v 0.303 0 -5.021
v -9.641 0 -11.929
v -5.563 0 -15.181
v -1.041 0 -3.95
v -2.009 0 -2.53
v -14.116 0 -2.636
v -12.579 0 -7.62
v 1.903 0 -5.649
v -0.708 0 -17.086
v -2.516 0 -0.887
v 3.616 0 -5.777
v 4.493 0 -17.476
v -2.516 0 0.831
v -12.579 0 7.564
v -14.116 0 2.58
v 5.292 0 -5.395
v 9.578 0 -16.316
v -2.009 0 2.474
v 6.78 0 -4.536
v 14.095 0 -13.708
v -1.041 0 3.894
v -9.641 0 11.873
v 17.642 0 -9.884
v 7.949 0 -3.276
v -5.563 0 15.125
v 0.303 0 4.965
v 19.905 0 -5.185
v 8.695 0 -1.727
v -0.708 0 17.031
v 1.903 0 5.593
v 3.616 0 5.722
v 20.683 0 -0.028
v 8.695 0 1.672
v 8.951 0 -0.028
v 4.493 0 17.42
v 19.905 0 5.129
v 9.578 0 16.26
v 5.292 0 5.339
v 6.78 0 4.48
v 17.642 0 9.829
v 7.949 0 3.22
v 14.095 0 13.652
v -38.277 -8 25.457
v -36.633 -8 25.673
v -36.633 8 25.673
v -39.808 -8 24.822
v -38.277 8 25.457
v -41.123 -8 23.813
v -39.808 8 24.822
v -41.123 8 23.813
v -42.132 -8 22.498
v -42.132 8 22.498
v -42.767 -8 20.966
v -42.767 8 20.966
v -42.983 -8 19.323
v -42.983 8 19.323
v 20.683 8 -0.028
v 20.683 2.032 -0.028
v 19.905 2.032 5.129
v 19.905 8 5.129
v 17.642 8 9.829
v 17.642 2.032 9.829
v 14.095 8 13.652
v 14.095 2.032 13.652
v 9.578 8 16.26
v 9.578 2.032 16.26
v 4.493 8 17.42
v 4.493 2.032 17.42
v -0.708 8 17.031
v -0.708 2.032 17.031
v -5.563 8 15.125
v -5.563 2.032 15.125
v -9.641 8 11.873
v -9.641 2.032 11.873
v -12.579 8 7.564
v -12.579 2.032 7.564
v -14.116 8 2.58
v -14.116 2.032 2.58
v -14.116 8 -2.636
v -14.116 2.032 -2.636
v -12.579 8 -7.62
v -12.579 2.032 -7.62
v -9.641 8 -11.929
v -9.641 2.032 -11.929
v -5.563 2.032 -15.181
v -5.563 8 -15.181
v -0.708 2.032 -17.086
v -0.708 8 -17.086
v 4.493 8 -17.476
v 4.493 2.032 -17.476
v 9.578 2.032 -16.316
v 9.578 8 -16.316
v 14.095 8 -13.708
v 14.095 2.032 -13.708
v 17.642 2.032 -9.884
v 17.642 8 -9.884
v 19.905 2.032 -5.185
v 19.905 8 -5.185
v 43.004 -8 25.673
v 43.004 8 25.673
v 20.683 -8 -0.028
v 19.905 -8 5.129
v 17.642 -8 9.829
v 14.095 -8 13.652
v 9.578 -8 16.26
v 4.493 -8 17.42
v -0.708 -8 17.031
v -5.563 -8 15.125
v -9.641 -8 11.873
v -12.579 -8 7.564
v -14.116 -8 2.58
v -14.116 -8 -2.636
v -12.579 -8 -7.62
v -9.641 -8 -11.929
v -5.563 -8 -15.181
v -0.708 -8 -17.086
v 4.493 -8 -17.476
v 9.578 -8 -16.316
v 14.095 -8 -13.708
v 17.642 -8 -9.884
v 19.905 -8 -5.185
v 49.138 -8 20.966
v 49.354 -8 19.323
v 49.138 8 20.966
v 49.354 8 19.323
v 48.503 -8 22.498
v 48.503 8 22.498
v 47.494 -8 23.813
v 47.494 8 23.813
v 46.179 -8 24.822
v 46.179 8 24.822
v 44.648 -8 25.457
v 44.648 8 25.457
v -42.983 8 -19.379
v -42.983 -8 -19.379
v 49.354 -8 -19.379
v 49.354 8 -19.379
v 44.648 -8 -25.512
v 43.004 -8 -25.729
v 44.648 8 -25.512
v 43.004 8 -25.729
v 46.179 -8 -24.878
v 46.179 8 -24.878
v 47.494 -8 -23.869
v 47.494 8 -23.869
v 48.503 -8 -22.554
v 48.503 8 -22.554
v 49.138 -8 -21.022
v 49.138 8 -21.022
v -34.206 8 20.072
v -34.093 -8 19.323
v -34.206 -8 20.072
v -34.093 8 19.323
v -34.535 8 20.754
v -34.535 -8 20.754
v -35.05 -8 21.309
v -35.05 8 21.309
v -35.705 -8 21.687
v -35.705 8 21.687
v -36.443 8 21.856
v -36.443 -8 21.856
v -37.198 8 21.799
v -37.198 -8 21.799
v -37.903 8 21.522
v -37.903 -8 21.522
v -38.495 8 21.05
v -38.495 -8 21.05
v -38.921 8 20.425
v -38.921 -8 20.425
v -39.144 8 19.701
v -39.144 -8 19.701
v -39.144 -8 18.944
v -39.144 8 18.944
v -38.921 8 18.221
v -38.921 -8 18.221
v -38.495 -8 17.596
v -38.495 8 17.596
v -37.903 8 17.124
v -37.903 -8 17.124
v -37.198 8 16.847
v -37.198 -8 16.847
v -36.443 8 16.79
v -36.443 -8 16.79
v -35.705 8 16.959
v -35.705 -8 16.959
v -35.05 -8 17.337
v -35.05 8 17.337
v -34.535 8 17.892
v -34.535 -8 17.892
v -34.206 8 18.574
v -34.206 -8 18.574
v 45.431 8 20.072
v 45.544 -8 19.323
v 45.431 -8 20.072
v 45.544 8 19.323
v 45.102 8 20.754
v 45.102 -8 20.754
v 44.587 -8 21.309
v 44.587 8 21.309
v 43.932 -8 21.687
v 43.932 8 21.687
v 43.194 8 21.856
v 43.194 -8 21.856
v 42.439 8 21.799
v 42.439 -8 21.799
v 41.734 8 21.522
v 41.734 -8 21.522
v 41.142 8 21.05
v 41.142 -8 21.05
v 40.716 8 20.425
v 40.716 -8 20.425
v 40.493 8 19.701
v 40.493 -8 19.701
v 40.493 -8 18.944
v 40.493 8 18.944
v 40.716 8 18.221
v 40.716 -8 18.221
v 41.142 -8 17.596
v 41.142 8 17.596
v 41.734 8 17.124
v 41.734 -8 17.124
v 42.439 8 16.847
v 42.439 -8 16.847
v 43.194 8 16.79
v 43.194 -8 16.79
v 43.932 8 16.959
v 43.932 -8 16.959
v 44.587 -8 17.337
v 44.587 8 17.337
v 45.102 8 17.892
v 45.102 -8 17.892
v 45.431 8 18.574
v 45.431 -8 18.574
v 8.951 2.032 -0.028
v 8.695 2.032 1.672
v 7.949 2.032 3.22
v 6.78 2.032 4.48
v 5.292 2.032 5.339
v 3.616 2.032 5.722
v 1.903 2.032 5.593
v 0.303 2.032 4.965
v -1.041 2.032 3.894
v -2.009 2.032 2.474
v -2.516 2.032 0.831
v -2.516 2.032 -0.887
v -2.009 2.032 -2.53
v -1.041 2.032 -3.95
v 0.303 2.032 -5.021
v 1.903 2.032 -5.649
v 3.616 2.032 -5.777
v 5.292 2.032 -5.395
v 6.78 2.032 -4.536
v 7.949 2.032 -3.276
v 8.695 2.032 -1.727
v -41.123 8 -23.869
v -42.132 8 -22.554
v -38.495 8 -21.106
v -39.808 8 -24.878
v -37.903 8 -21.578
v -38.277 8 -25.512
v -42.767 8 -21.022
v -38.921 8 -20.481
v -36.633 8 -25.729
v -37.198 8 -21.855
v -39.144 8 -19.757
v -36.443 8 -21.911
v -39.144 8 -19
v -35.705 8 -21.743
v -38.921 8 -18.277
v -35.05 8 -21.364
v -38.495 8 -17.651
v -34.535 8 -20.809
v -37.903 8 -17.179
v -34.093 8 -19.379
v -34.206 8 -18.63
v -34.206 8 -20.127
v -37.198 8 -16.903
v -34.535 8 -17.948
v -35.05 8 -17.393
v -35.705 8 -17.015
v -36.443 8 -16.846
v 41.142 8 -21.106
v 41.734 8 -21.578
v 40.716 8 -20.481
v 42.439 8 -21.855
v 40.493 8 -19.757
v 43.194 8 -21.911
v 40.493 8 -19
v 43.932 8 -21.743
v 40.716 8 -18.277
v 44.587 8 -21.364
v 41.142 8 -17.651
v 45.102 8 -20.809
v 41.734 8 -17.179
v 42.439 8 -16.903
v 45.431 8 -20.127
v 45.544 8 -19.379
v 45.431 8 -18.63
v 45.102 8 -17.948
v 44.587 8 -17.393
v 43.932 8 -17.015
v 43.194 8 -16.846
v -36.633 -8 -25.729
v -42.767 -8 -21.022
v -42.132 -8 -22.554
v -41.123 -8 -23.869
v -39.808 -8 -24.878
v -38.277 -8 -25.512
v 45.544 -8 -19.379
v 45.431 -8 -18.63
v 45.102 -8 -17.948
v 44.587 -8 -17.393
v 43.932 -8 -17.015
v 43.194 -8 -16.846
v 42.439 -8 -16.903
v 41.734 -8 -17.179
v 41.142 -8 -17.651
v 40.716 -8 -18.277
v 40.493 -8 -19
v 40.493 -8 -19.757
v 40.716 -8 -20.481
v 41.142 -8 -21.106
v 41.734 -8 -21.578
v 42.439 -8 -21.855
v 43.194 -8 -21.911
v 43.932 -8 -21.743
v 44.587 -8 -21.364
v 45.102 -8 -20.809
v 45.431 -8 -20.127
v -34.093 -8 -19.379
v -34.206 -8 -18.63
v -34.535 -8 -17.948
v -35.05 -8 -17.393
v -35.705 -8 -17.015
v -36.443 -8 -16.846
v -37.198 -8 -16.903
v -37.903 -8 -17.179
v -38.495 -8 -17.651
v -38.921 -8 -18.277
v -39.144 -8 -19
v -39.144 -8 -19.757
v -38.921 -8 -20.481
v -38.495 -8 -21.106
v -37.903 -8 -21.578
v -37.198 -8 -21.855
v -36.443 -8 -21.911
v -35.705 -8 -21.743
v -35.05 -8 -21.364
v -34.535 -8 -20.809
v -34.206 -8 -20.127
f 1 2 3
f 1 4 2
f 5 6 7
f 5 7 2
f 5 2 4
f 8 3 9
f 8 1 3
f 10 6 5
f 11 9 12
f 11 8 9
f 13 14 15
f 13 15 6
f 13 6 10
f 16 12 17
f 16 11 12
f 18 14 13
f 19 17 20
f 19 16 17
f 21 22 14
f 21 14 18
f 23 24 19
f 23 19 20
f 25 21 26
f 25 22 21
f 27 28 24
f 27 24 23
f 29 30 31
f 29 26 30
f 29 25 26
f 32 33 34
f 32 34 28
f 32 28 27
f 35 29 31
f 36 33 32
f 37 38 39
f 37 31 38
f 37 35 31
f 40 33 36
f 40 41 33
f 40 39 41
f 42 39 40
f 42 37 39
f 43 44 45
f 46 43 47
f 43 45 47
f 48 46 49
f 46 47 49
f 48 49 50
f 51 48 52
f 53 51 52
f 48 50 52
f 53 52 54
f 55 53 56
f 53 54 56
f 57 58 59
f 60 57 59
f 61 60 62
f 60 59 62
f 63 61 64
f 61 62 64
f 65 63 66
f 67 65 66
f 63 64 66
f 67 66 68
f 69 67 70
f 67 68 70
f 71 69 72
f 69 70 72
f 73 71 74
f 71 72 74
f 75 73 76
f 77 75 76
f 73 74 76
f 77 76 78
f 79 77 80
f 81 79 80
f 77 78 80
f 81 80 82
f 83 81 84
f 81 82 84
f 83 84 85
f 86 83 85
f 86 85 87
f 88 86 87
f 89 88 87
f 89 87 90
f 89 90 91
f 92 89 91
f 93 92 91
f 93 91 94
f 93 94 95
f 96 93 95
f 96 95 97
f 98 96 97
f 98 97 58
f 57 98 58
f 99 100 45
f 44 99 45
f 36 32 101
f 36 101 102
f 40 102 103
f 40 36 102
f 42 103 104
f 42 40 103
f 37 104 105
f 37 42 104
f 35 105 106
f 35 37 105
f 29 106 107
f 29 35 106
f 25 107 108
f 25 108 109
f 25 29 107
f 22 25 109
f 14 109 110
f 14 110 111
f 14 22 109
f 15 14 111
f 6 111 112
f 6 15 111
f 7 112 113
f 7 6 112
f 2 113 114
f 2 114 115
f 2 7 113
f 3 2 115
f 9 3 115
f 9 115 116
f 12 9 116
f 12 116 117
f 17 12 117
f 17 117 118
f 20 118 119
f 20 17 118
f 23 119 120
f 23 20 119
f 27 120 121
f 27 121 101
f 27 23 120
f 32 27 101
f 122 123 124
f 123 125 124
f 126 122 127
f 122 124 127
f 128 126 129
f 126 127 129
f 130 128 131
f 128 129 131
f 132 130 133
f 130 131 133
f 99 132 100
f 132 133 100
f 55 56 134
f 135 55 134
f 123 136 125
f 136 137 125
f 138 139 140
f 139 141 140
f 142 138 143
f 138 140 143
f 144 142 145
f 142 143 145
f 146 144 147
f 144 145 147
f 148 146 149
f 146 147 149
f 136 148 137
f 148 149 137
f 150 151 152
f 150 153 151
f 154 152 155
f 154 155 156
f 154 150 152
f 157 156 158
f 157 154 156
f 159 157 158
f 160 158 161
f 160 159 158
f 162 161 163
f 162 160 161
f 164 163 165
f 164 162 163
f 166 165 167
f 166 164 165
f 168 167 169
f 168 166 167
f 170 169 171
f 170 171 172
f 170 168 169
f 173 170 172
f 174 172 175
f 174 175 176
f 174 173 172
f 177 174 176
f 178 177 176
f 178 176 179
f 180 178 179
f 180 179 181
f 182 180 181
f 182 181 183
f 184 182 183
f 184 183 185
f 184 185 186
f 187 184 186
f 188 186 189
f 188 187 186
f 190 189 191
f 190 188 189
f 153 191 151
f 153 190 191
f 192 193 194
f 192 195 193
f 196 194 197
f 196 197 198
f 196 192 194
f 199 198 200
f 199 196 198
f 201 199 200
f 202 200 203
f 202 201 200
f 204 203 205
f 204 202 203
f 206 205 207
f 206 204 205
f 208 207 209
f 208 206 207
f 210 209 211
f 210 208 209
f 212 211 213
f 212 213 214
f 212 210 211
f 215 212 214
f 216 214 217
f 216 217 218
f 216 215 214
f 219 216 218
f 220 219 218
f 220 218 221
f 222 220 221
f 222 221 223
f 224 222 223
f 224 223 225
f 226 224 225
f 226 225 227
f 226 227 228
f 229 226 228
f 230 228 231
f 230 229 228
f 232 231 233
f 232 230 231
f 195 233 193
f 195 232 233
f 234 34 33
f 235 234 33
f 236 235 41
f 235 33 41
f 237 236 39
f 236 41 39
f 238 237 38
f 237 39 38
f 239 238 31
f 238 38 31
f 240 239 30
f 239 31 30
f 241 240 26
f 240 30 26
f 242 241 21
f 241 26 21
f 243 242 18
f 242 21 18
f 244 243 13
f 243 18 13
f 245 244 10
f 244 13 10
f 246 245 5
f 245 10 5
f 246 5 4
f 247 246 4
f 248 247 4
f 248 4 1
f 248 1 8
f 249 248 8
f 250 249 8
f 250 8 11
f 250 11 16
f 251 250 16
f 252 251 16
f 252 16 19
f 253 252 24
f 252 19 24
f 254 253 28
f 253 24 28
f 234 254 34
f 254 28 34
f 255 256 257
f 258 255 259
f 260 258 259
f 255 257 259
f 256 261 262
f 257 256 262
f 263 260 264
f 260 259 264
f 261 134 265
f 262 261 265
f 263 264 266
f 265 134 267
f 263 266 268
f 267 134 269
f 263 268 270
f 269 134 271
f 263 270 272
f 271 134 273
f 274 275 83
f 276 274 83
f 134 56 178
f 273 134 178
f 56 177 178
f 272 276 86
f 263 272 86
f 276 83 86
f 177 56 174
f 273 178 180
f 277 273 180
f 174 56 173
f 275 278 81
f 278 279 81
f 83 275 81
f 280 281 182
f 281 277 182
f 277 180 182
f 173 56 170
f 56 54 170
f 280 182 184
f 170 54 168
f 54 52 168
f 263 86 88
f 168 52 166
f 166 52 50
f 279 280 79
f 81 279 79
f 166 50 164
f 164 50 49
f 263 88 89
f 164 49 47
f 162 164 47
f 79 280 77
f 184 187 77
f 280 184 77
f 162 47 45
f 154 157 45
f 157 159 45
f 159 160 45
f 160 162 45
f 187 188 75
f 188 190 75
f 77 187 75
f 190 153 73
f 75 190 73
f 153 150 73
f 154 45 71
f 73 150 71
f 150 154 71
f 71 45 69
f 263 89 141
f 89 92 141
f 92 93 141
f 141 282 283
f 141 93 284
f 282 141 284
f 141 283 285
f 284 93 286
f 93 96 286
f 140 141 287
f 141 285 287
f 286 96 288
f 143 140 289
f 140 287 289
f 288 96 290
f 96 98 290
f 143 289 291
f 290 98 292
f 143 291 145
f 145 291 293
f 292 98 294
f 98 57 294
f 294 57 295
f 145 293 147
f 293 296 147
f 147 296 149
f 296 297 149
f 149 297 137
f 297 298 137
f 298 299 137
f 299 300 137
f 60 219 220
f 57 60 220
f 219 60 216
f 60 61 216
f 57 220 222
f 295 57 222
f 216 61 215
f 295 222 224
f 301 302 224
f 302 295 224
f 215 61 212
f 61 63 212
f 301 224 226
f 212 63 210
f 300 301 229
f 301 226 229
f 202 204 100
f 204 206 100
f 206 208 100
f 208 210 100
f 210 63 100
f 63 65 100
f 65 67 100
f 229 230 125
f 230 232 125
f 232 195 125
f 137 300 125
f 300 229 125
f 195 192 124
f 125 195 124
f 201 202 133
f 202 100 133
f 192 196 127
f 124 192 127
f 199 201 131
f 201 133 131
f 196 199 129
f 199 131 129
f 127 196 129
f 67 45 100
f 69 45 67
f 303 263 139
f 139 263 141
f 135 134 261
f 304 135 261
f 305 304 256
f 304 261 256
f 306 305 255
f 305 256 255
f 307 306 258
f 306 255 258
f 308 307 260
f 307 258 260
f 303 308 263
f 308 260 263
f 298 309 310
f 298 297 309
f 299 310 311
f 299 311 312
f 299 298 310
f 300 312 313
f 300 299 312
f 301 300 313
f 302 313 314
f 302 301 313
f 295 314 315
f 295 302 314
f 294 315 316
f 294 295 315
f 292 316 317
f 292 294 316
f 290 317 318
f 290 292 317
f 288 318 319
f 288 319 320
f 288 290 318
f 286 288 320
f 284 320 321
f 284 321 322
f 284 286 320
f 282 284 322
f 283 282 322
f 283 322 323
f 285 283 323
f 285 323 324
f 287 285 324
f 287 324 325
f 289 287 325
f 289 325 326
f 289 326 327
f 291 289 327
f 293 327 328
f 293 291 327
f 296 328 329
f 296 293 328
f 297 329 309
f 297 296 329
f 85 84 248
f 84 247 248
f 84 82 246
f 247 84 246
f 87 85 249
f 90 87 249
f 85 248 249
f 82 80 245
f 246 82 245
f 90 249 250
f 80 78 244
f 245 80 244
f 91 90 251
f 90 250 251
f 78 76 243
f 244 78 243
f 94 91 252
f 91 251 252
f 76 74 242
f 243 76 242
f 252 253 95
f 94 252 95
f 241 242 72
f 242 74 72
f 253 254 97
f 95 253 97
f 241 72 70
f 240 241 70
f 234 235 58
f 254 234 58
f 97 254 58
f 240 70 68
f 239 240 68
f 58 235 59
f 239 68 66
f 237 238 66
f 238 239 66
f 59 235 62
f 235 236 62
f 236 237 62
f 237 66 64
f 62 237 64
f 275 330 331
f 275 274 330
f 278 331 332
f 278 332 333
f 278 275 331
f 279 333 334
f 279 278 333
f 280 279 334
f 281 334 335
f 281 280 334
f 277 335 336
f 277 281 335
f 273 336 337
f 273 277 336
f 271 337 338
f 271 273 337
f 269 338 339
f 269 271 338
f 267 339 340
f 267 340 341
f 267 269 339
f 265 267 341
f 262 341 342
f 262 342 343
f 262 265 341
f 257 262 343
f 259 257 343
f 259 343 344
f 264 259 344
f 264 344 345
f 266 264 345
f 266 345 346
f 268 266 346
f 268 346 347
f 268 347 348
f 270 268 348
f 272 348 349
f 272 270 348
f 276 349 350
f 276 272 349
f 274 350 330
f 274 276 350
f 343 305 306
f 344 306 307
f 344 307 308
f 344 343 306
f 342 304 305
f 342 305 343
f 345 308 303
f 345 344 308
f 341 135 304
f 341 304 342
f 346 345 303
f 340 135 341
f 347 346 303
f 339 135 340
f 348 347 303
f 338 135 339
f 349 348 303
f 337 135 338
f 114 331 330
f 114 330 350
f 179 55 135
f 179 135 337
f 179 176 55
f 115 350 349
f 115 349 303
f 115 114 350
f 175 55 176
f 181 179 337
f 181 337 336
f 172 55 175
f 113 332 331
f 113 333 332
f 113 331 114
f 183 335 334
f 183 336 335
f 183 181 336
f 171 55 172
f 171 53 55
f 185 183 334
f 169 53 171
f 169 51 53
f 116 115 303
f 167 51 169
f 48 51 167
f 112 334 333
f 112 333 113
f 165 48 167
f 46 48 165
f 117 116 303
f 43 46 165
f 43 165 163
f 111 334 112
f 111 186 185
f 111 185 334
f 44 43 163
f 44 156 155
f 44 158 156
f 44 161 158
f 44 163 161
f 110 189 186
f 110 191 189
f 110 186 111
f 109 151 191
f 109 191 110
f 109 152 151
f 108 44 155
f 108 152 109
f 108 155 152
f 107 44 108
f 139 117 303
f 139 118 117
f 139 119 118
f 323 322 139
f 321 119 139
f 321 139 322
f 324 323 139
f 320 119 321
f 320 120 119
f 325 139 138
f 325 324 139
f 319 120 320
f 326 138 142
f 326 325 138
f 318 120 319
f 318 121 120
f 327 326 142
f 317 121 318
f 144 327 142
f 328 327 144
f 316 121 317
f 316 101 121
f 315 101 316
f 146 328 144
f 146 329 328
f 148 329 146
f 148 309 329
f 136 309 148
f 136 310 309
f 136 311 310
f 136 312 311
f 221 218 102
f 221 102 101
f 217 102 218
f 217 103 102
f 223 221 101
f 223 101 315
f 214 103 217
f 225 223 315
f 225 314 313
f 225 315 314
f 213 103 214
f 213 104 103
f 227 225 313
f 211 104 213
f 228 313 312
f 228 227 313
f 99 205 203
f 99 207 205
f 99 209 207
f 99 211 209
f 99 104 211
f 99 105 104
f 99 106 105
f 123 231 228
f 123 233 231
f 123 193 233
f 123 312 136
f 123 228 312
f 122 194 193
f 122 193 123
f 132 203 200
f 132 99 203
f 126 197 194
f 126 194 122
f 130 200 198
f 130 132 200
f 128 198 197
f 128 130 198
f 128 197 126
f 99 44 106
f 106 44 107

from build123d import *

# Parameters (mm, degrees)
F0_R     = 17.4971354571
F0_R_2   = 11.8450866669
F0_R_3   = 5.7656301988
F1_DEPTH = 2.032
F0_R_4   = 2.5396522034
F2_DEPTH = 8
F3_DEPTH = 8


# Not quite as in the source:
# - a feature names something its author has since deleted; it is built from what else it names


with BuildPart() as f1:
    # F0 (on Front) → F1 (new body)
    with BuildSketch(Plane.XZ):
        with Locations((3.1854841864, -0.0279111721)):
            Circle(F0_R)
        with Locations((3.1854841864, -0.0279111721)):
            Circle(F0_R_2, mode=Mode.SUBTRACT)
        with Locations((3.1854841864, -0.0279111721)):
            Circle(F0_R_2)
        with Locations((3.1854841864, -0.0279111721)):
            Circle(F0_R_3, mode=Mode.SUBTRACT)
    extrude(amount=-F1_DEPTH)

    # F0 (on Front) → F2 (join)
    with BuildSketch(Plane.XZ):
        with BuildLine():
            ThreePointArc((-42.9830769071, -19.3787951119), (-41.1232049677, -23.8689231724), (-36.6330769071, -25.7287951119))
            Line((-36.6330769071, -25.7287951119), (43.0040508678, -25.7287951119))
            ThreePointArc((43.0040508678, -25.7287951119), (47.4941789284, -23.8689231724), (49.3540508678, -19.3787951119))
            Line((49.3540508678, -19.3787951119), (49.3540508678, 19.3229727678))
            ThreePointArc((49.3540508678, 19.3229727678), (47.4941772917, 23.8131047796), (43.0040452799, 25.6729783557))
            Line((43.0040452799, 25.6729783557), (-36.6330769071, 25.6729783557))
            ThreePointArc((-36.6330769071, 25.6729783557), (-41.1232049677, 23.8131064163), (-42.9830769071, 19.3229783557))
            Line((-42.9830769071, 19.3229783557), (-42.9830769071, -19.3787951119))
        make_face()
        with Locations((-36.6330769071, -19.3787951119)):
            Circle(F0_R_4, mode=Mode.SUBTRACT)
        with Locations((3.1854841864, -0.0279111721)):
            Circle(F0_R, mode=Mode.SUBTRACT)
        with Locations((43.0040452799, -19.3787951119)):
            Circle(F0_R_4, mode=Mode.SUBTRACT)
        with Locations((-36.6330769071, 19.3229727678)):
            Circle(F0_R_4, mode=Mode.SUBTRACT)
        with Locations((43.0040452799, 19.3229727678)):
            Circle(F0_R_4, mode=Mode.SUBTRACT)
    extrude(amount=-F2_DEPTH)

    # F0 (on Front) → F3 (join)
    with BuildSketch(Plane.XZ):
        with BuildLine():
            ThreePointArc((-42.9830769071, -19.3787951119), (-41.1232049677, -23.8689231724), (-36.6330769071, -25.7287951119))
            Line((-36.6330769071, -25.7287951119), (43.0040508678, -25.7287951119))
            ThreePointArc((43.0040508678, -25.7287951119), (47.4941789284, -23.8689231724), (49.3540508678, -19.3787951119))
            Line((49.3540508678, -19.3787951119), (49.3540508678, 19.3229727678))
            ThreePointArc((49.3540508678, 19.3229727678), (47.4941772917, 23.8131047796), (43.0040452799, 25.6729783557))
            Line((43.0040452799, 25.6729783557), (-36.6330769071, 25.6729783557))
            ThreePointArc((-36.6330769071, 25.6729783557), (-41.1232049677, 23.8131064163), (-42.9830769071, 19.3229783557))
            Line((-42.9830769071, 19.3229783557), (-42.9830769071, -19.3787951119))
        make_face()
        with Locations((-36.6330769071, -19.3787951119)):
            Circle(F0_R_4, mode=Mode.SUBTRACT)
        with Locations((3.1854841864, -0.0279111721)):
            Circle(F0_R, mode=Mode.SUBTRACT)
        with Locations((43.0040452799, -19.3787951119)):
            Circle(F0_R_4, mode=Mode.SUBTRACT)
        with Locations((-36.6330769071, 19.3229727678)):
            Circle(F0_R_4, mode=Mode.SUBTRACT)
        with Locations((43.0040452799, 19.3229727678)):
            Circle(F0_R_4, mode=Mode.SUBTRACT)
    extrude(amount=F3_DEPTH)


solid = f1.part
